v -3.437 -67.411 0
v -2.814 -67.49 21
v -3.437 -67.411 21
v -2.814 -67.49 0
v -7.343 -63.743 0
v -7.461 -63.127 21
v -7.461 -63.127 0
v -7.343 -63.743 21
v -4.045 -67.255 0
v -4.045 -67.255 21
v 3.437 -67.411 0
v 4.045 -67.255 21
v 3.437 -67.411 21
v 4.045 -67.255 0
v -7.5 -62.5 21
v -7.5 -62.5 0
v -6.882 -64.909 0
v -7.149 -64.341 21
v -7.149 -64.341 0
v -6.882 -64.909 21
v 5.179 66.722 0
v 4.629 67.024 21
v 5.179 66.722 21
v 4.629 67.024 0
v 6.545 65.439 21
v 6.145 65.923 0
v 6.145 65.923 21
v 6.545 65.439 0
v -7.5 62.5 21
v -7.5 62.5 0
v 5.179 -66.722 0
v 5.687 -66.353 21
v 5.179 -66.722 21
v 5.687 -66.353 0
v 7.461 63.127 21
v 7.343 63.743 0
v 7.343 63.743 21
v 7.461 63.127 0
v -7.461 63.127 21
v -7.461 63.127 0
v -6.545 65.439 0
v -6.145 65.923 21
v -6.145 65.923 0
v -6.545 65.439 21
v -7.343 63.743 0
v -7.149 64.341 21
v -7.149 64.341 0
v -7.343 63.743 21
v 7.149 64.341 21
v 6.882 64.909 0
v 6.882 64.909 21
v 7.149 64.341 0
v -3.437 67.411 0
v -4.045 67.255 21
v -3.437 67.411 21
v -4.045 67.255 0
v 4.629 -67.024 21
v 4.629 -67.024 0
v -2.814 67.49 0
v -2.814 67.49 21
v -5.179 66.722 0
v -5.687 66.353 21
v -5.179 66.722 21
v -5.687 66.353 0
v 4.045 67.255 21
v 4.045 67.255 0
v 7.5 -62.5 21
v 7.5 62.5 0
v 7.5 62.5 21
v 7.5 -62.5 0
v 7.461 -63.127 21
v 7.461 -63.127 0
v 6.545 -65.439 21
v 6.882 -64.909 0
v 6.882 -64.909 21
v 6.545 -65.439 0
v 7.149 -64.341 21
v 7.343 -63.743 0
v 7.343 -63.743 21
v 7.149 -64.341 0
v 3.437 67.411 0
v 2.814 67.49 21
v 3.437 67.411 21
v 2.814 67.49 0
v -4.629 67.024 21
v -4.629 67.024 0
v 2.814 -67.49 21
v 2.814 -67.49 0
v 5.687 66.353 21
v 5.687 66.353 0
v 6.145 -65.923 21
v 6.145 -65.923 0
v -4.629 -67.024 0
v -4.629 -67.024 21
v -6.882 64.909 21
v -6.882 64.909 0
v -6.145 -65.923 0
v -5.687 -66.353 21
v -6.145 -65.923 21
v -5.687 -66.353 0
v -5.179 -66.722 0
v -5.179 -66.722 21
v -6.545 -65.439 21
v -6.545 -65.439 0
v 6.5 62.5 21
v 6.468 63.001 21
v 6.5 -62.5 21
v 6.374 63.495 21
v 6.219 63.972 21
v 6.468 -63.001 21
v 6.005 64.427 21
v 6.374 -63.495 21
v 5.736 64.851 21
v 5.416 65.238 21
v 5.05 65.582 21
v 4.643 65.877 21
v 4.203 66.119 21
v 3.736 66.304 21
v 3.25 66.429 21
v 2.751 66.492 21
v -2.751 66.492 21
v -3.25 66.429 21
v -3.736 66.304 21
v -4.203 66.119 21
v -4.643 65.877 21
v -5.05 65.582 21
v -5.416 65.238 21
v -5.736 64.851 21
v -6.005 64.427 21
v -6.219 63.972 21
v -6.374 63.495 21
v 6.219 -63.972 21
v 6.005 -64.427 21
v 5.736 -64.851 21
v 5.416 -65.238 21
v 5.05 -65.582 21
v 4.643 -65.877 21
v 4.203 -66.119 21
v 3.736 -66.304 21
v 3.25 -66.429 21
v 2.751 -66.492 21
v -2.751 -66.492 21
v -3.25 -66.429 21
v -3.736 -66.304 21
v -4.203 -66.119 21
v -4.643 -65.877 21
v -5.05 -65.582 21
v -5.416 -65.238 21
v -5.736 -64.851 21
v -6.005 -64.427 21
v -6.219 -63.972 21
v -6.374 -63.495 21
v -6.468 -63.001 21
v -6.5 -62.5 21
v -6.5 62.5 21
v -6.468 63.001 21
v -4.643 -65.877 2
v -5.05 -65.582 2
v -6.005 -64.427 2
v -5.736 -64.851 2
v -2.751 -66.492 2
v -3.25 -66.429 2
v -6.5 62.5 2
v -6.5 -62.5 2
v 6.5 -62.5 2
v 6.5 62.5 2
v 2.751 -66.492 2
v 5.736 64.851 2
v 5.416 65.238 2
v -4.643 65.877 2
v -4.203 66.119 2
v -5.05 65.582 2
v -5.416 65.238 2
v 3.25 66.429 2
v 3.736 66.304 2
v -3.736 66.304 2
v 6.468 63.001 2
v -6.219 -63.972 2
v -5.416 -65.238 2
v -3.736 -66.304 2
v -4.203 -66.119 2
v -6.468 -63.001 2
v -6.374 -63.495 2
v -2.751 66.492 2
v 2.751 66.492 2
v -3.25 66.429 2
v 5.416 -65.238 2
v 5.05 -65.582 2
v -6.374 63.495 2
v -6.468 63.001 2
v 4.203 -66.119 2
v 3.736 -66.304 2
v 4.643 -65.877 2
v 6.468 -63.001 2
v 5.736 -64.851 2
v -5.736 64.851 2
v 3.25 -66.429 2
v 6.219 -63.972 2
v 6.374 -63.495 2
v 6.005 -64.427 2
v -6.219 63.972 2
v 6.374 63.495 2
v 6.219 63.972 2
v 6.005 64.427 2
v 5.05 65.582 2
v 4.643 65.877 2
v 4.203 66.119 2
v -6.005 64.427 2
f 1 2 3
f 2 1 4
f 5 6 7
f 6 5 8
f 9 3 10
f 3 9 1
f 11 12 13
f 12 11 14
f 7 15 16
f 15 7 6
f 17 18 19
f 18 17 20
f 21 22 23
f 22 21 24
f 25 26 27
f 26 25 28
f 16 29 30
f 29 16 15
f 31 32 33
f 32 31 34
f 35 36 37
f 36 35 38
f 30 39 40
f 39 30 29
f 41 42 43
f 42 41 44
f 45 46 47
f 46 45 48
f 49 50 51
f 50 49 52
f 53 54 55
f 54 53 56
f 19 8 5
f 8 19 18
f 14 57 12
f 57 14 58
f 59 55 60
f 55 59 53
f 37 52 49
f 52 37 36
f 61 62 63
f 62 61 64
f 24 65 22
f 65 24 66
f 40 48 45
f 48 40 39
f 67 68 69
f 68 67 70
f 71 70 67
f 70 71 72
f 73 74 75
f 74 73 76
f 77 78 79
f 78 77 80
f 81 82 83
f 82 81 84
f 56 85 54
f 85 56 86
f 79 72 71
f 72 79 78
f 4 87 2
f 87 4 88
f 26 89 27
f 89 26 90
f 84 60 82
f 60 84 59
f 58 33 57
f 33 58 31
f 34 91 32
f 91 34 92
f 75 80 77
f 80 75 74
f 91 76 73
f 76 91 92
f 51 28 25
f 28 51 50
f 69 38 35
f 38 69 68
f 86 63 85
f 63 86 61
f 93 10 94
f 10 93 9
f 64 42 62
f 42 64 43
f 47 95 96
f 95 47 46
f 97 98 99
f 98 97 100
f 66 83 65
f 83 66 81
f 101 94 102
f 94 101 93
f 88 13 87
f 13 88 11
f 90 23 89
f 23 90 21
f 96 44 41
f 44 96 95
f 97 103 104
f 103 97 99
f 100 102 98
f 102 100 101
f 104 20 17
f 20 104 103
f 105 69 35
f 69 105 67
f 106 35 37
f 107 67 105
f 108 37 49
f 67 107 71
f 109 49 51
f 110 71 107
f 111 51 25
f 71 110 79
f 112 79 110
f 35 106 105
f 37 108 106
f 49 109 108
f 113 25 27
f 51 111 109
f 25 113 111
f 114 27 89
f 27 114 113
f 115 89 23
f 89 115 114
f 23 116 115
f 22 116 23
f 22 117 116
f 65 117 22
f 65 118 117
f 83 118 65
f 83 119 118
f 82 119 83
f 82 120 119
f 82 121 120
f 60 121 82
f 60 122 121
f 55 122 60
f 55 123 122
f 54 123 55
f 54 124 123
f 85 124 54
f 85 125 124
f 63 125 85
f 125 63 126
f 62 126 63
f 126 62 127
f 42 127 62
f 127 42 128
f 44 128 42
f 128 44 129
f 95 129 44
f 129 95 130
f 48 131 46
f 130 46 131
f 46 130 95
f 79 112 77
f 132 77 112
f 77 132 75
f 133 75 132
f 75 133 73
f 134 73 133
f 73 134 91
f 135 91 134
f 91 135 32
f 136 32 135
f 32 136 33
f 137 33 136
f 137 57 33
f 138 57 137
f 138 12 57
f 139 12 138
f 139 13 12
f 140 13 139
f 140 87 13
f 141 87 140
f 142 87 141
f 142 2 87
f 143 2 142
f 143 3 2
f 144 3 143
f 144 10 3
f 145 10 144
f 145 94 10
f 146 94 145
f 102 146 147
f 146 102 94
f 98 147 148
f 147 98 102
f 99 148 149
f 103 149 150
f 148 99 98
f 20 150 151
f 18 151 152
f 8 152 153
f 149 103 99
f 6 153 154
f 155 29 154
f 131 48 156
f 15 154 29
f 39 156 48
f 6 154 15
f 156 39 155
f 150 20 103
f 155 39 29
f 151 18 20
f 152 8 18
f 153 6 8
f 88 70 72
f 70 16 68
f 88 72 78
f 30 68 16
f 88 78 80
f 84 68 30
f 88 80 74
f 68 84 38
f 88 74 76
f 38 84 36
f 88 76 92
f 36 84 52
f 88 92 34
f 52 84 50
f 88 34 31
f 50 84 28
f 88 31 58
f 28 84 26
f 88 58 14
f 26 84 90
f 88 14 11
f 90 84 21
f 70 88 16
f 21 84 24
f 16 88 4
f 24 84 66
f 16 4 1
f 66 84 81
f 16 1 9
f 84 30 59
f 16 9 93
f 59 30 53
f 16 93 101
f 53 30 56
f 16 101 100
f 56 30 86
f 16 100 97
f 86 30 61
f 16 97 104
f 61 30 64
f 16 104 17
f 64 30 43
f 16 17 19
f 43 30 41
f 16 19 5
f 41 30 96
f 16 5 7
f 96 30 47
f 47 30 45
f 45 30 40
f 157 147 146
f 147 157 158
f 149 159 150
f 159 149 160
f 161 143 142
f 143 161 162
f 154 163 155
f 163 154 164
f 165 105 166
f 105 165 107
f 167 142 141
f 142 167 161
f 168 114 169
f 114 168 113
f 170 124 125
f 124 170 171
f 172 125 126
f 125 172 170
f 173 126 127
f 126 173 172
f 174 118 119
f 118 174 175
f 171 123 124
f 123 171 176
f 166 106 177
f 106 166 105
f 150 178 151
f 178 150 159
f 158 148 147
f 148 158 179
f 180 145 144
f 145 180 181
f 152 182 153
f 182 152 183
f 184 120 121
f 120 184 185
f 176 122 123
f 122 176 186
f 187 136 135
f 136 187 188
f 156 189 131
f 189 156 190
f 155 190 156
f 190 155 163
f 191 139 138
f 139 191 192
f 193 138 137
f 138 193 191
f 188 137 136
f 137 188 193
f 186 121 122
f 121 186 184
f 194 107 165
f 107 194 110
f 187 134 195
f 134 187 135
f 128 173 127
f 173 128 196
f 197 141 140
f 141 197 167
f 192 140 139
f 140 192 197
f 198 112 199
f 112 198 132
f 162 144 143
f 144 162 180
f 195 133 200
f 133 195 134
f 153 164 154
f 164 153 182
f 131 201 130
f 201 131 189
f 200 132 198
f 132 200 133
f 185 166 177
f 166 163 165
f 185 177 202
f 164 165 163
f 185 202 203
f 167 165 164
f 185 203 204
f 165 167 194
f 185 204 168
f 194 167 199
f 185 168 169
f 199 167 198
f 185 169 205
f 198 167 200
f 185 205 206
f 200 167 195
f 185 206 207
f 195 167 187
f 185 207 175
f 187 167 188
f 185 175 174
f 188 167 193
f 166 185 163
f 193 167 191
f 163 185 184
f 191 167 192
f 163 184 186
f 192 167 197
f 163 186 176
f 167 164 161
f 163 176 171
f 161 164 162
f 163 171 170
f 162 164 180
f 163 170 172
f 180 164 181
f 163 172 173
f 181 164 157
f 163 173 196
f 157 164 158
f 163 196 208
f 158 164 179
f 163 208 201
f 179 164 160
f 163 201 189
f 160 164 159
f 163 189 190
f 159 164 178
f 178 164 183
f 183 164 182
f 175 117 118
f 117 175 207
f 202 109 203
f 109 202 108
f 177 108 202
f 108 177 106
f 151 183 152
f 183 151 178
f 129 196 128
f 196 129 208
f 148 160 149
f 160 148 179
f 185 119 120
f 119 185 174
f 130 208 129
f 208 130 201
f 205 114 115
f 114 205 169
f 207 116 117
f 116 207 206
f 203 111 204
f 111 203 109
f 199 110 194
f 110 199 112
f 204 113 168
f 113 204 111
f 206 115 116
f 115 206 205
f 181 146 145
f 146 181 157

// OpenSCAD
$fn = 50;


difference() {
	union() {
		hull() {
			translate(v = [-2.5000000000, 62.5000000000, 0]) {
				cylinder(h = 21, r = 5);
			}
			translate(v = [2.5000000000, 62.5000000000, 0]) {
				cylinder(h = 21, r = 5);
			}
			translate(v = [-2.5000000000, -62.5000000000, 0]) {
				cylinder(h = 21, r = 5);
			}
			translate(v = [2.5000000000, -62.5000000000, 0]) {
				cylinder(h = 21, r = 5);
			}
		}
	}
	union() {
		translate(v = [0, 0, 2]) {
			hull() {
				translate(v = [-2.5000000000, 62.5000000000, 0]) {
					cylinder(h = 19, r = 4);
				}
				translate(v = [2.5000000000, 62.5000000000, 0]) {
					cylinder(h = 19, r = 4);
				}
				translate(v = [-2.5000000000, -62.5000000000, 0]) {
					cylinder(h = 19, r = 4);
				}
				translate(v = [2.5000000000, -62.5000000000, 0]) {
					cylinder(h = 19, r = 4);
				}
			}
		}
	}
}
